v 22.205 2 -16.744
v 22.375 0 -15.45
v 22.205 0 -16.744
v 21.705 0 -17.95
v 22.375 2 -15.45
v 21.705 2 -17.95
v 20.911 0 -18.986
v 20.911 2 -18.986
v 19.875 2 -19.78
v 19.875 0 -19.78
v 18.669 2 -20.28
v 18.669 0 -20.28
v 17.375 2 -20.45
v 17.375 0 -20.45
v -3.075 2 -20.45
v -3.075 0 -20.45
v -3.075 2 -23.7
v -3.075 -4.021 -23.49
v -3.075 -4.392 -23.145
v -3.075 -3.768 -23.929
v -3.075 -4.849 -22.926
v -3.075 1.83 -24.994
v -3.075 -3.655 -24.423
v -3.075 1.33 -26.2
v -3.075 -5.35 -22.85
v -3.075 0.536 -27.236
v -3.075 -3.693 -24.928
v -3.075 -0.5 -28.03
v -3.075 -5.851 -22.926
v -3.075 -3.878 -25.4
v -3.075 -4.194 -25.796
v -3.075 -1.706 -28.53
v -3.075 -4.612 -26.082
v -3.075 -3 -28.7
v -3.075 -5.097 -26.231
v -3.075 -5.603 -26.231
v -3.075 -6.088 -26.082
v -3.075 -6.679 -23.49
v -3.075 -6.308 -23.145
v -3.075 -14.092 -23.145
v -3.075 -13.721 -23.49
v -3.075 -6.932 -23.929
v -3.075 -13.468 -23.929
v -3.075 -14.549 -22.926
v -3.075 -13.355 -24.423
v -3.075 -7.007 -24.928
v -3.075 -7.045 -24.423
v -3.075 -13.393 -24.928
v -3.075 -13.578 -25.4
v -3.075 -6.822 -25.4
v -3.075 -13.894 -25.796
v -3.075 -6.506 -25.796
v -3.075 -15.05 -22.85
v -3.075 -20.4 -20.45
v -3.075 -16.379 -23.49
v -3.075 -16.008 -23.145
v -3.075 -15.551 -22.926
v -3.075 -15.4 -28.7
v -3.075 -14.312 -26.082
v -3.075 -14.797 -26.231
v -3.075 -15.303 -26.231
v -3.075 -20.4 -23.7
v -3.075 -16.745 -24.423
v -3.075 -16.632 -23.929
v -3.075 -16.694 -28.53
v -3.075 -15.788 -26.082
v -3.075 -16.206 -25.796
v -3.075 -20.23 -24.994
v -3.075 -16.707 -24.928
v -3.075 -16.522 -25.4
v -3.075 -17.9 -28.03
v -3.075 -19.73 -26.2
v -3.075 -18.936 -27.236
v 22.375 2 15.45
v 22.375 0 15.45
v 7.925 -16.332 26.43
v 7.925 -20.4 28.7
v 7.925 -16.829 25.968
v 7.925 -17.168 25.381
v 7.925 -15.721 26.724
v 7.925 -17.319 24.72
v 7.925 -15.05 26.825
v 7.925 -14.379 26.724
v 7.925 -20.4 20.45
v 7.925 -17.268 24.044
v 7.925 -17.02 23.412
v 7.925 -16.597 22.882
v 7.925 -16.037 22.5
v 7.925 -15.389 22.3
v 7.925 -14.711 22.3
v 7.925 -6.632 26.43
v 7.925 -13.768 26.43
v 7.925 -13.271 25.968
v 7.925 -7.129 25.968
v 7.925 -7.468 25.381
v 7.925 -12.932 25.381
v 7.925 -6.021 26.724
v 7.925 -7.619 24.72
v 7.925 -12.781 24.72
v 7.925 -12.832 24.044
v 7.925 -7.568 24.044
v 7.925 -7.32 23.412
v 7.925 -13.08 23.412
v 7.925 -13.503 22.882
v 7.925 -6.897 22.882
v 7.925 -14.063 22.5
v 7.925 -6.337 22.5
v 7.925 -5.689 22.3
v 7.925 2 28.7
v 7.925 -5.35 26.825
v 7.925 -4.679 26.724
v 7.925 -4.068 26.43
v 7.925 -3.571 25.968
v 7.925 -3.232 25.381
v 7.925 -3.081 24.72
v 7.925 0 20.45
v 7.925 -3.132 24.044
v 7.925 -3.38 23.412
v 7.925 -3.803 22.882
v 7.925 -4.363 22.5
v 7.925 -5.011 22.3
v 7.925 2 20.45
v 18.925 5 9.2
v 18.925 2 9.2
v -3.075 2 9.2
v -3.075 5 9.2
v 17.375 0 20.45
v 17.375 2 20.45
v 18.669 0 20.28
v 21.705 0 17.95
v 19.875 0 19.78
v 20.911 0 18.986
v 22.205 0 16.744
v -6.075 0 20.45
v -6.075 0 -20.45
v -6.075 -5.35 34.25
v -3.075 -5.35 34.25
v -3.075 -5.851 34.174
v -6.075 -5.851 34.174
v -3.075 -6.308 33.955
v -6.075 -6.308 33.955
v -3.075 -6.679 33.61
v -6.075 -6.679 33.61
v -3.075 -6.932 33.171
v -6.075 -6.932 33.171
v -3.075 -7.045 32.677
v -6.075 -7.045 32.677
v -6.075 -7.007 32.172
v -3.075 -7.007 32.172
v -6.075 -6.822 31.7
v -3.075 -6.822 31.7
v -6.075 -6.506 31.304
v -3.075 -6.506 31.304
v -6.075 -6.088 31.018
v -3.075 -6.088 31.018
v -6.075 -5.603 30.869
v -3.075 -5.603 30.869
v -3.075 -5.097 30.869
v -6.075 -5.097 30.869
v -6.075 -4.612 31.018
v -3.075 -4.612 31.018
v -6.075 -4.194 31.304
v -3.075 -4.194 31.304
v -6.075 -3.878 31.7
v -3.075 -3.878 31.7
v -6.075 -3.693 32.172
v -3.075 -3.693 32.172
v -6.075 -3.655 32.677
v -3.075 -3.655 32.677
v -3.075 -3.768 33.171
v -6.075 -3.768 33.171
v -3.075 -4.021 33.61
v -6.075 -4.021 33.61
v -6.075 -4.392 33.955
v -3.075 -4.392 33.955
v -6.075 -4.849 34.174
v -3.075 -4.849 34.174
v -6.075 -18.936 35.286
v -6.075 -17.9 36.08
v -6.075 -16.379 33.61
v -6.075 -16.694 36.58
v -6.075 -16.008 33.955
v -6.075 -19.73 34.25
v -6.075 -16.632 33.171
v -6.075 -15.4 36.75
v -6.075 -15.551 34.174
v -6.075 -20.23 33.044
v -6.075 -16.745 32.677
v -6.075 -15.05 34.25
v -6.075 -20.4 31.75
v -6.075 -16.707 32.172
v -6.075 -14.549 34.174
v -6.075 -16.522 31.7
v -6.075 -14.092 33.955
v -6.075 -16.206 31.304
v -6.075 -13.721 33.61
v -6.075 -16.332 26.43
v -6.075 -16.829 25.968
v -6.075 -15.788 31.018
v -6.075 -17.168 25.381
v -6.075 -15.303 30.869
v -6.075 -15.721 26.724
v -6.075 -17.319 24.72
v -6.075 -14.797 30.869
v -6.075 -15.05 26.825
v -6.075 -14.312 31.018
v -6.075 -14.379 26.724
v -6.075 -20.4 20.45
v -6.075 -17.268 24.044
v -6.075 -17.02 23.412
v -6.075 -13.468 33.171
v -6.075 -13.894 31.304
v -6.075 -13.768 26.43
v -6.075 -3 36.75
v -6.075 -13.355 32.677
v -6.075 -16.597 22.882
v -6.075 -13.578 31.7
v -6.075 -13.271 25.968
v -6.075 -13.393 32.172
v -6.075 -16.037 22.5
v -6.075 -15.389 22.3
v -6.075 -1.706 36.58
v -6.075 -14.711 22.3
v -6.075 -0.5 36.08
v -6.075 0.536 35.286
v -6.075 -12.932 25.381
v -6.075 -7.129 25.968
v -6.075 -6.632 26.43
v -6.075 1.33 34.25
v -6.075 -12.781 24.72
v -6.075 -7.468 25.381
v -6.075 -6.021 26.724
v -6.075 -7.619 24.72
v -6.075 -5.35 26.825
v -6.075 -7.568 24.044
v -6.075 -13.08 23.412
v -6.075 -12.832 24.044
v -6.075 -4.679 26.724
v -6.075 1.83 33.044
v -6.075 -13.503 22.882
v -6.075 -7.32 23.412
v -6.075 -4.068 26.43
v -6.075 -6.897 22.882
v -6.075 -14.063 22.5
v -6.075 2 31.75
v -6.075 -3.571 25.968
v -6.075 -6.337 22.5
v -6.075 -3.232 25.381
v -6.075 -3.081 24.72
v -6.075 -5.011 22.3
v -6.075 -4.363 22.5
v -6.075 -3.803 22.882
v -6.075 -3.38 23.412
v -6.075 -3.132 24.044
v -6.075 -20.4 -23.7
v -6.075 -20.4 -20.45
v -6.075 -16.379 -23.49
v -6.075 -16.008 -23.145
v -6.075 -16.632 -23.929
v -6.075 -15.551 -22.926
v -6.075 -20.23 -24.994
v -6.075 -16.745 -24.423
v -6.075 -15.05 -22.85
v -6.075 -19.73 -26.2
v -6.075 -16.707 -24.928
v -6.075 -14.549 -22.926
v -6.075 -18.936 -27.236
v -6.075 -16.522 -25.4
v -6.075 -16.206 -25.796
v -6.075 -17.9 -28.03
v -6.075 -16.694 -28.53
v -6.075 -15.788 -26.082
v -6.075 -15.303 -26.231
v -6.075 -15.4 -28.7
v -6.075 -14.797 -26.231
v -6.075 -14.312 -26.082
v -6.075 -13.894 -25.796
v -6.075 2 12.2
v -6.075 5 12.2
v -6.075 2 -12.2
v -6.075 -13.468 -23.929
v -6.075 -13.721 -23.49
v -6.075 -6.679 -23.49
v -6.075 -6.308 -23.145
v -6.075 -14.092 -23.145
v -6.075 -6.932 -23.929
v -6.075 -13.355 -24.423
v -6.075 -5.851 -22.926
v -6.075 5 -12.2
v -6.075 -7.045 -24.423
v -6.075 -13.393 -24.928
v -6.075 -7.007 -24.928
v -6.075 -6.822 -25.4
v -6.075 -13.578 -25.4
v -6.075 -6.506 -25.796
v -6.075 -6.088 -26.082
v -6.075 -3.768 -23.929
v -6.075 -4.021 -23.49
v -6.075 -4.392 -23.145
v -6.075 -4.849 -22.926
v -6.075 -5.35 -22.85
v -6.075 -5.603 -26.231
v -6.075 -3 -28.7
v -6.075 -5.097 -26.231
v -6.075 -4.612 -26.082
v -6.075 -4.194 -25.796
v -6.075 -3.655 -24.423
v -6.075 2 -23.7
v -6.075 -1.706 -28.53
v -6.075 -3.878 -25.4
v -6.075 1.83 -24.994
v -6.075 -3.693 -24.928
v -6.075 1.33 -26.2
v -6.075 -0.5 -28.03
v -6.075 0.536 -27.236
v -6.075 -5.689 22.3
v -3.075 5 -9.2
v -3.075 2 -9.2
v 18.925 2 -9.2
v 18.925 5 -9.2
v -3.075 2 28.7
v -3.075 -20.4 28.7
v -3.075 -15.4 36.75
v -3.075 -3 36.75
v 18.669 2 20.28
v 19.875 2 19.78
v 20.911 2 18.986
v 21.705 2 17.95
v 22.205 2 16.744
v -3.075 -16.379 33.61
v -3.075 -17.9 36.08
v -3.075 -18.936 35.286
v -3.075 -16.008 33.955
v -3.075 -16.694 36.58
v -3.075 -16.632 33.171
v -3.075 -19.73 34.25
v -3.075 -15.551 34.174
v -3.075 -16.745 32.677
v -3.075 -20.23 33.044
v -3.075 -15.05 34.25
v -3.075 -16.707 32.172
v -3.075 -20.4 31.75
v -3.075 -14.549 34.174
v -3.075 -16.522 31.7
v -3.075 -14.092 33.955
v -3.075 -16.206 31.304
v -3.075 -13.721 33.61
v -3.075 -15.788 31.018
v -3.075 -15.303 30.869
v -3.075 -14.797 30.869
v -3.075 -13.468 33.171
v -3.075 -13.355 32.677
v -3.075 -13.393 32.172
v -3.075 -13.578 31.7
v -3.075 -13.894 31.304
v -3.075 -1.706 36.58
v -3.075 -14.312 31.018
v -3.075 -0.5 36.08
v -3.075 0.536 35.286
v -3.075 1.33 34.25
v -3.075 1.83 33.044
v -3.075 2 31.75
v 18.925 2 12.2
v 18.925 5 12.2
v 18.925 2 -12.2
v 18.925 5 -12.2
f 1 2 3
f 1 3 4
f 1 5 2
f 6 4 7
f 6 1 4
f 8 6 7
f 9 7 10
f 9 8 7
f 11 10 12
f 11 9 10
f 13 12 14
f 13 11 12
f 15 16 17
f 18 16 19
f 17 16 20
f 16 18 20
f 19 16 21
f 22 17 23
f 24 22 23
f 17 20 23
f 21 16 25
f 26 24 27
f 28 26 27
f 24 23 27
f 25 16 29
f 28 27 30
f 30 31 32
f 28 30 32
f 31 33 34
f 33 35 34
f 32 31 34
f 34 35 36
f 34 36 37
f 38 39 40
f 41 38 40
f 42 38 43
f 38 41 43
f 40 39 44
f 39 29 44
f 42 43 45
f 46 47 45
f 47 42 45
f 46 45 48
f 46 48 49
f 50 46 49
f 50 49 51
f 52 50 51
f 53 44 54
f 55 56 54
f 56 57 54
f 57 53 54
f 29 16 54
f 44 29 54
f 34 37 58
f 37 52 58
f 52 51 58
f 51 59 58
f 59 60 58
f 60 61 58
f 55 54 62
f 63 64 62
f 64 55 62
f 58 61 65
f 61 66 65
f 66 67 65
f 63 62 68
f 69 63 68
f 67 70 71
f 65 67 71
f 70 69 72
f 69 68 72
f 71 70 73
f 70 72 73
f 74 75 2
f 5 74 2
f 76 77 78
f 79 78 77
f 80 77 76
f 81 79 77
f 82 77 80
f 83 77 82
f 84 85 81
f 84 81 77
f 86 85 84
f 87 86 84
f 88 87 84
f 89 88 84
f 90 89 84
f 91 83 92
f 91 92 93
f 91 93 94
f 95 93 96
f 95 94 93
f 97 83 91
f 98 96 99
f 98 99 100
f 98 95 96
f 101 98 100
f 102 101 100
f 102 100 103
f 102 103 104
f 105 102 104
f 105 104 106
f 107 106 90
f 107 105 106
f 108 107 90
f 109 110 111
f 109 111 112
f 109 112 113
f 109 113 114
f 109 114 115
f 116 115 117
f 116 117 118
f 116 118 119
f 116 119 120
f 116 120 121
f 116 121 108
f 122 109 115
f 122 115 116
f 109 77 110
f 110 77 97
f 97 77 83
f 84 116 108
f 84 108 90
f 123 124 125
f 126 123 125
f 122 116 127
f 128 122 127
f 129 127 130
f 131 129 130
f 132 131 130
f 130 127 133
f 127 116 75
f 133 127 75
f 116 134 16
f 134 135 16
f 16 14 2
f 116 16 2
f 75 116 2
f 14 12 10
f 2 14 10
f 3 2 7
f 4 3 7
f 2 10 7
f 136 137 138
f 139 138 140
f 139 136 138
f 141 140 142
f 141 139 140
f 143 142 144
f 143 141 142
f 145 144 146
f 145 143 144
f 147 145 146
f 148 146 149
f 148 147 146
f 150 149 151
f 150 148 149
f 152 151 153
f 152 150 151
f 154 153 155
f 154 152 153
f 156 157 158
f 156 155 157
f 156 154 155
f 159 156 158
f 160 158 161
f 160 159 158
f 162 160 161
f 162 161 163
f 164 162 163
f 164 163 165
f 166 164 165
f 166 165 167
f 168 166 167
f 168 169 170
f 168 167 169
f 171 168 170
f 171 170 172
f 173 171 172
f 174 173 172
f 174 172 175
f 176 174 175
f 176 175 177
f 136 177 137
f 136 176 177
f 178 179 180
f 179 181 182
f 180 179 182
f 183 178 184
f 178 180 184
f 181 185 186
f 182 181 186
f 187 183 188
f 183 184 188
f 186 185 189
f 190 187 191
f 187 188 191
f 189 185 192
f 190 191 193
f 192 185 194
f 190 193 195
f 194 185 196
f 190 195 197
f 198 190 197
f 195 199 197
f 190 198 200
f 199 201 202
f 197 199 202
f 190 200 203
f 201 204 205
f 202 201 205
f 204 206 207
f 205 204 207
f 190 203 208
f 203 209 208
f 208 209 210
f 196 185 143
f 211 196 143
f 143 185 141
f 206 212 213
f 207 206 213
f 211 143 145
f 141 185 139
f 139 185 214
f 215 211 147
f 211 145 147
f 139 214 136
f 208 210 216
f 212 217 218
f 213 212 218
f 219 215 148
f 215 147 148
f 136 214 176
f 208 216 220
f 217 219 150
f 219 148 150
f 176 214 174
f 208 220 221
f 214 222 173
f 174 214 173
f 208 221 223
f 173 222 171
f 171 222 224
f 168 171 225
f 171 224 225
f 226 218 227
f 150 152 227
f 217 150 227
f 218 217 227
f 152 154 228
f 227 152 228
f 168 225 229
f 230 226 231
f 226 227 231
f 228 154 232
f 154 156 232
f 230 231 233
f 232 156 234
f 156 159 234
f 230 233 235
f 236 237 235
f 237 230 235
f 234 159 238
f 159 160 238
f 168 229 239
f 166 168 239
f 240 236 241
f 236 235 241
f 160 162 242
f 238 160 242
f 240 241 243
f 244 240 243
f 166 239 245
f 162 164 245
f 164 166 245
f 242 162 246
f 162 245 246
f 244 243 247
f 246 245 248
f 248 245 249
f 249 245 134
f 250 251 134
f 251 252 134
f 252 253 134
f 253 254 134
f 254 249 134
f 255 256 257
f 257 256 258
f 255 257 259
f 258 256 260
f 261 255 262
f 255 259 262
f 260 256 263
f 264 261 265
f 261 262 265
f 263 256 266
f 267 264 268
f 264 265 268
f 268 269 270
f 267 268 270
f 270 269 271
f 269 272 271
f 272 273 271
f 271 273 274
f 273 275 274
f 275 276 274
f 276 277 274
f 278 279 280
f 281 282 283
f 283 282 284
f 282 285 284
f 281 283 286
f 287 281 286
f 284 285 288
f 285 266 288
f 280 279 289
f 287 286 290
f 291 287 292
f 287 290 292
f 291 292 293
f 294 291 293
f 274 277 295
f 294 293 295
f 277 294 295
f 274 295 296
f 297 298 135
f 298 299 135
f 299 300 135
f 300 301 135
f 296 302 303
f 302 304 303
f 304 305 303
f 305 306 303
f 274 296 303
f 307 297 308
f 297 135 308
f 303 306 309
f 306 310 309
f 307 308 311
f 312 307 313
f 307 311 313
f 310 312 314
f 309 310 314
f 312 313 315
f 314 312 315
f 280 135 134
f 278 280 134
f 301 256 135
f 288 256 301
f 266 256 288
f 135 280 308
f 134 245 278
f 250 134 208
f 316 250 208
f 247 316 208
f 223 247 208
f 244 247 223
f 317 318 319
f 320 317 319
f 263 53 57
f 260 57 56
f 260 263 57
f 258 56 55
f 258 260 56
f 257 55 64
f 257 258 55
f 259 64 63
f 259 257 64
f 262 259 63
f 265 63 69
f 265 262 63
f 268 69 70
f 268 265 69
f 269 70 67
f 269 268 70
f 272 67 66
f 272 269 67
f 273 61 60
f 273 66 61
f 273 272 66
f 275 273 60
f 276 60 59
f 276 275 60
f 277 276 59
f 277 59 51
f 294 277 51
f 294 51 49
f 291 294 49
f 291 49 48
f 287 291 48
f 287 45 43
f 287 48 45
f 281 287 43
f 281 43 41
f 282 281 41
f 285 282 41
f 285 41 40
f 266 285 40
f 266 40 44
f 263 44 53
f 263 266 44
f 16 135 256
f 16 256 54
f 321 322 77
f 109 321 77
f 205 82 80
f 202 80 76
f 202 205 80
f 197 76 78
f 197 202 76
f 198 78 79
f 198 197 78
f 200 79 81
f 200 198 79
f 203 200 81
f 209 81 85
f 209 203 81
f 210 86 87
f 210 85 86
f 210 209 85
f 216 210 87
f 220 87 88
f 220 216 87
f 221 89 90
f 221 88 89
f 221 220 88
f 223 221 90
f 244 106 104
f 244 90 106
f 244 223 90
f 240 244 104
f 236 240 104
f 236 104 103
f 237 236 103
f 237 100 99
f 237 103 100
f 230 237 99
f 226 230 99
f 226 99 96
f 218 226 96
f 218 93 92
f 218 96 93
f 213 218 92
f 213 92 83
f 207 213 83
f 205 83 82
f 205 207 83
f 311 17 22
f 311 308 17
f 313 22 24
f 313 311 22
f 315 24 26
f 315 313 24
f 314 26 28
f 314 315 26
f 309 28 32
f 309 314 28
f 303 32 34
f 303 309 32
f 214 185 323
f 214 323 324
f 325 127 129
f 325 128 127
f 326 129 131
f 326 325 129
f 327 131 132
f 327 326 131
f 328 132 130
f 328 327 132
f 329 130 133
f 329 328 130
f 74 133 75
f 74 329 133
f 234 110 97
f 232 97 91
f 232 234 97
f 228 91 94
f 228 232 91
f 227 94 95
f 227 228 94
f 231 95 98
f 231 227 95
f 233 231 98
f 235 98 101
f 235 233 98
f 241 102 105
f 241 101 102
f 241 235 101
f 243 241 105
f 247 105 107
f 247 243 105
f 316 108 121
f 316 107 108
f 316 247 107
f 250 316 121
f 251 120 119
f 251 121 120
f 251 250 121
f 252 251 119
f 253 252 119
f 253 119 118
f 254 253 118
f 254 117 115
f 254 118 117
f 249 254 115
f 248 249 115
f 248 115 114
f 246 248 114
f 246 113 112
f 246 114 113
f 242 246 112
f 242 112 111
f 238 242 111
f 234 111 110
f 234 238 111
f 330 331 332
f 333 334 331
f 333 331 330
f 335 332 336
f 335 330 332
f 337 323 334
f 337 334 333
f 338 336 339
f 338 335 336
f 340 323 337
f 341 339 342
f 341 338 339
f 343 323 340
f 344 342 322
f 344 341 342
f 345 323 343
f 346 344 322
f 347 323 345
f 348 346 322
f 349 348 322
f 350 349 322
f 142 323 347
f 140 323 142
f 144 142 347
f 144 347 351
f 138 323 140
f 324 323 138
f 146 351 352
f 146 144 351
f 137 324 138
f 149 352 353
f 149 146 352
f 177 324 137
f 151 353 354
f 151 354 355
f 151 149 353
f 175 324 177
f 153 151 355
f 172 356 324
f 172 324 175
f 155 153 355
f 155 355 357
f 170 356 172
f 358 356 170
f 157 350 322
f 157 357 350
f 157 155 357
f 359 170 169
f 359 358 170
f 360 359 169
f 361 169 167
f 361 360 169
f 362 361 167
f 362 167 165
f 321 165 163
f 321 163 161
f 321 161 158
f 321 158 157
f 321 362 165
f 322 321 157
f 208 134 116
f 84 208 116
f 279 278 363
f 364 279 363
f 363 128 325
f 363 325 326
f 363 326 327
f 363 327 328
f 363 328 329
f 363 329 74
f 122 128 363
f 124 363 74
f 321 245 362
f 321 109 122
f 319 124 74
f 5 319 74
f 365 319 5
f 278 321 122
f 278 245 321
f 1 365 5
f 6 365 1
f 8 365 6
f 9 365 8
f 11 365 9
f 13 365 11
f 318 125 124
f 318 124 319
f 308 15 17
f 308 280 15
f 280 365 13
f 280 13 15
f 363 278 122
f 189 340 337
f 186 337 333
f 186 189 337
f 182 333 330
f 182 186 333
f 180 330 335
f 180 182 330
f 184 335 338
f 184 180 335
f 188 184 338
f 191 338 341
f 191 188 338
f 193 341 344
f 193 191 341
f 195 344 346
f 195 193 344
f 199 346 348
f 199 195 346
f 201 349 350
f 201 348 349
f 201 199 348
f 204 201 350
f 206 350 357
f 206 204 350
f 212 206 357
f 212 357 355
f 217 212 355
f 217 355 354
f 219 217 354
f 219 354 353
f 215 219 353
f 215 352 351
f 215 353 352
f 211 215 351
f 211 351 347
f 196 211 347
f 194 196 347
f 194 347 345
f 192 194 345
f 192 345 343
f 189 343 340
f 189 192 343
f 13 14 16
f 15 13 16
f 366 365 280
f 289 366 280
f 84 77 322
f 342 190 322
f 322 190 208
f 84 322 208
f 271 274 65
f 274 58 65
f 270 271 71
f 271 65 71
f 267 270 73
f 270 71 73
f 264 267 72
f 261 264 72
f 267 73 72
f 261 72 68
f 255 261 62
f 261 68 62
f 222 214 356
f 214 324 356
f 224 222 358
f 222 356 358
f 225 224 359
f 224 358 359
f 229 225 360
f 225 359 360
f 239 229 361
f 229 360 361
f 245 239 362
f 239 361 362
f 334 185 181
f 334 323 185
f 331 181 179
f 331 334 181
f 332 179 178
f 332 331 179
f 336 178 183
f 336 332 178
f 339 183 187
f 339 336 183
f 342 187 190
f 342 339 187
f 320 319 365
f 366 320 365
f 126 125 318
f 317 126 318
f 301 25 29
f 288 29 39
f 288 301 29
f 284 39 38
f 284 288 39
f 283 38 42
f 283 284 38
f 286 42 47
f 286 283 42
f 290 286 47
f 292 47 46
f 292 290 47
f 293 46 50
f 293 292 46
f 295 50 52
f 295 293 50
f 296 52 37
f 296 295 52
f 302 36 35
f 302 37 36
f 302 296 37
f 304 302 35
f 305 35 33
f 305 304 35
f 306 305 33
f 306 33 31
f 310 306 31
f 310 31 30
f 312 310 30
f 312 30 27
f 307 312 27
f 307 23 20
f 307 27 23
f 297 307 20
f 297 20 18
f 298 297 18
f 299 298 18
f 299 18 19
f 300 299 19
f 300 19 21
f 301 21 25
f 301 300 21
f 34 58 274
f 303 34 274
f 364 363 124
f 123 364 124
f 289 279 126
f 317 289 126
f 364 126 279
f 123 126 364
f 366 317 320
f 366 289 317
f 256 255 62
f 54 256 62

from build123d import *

# Parameters (mm, degrees)
BOSS_EXTRUDE1_DEPTH = 2
SKETCH1_3_W         = 14
SKETCH1_3_H         = 8.25
SKETCH1_3_W_2       = 3
BOSS_EXTRUDE2_DEPTH = 20.4
BOSS_EXTRUDE4_START = -6.075
SKETCH5_W           = 8.05
SKETCH5_H           = 22.4
BOSS_EXTRUDE4_DEPTH = 3
CUT_EXTRUDE1_START  = -6.075
SKETCH2_R           = 1.7
SKETCH2_R_2         = 2.275
CUT_EXTRUDE1_DEPTH  = 54.691836571
FILLET1_R           = 5
SKETCH6_W           = 3
SKETCH6_H           = 18.4
BOSS_EXTRUDE5_DEPTH = 5


with BuildPart() as part:
    # Sketch1 → Boss-Extrude1 (new body)
    with BuildSketch(Plane(origin=(0, 0, 0), x_dir=(1, 0, 0), z_dir=(0, 1, 0))):
        Polygon((22.375, -20.45), (22.375, 20.45), (-3.075, 20.45), (-3.075, 28.7), (-6.075, 28.7), (-6.075, -28.7), (7.925, -28.7), (7.925, -20.45), align=None)
    extrude(amount=BOSS_EXTRUDE1_DEPTH)

    # Sketch1<3> → Boss-Extrude2 (add)
    with BuildSketch(Plane(origin=(0, 0, 0), x_dir=(1, 0, 0), z_dir=(0, 1, 0))):
        with Locations((0.925, -24.575)):
            Rectangle(SKETCH1_3_W, SKETCH1_3_H)
        with Locations((-4.575, 24.575)):
            Rectangle(SKETCH1_3_W_2, SKETCH1_3_H)
    extrude(amount=-BOSS_EXTRUDE2_DEPTH)

    # Sketch5 → Boss-Extrude4 (add)
    with BuildSketch(Plane(origin=(0, 0, 0), x_dir=(0, 0, -1), z_dir=(1, 0, 0)).offset(BOSS_EXTRUDE4_START)):
        with Locations((-32.725, -9.2)):
            Rectangle(SKETCH5_W, SKETCH5_H)
    extrude(amount=BOSS_EXTRUDE4_DEPTH)

    # Sketch2 → Cut-Extrude1 (cut, through all)
    with BuildSketch(Plane(origin=(0, 0, 0), x_dir=(0, 0, -1), z_dir=(1, 0, 0)).offset(CUT_EXTRUDE1_START)):
        with Locations(Location((24.55, -15.05, 0), (0, 0, 180))):
            Circle(SKETCH2_R)
        with Locations(Location((-24.55, -15.05, 0), (0, 0, 180))):
            Circle(SKETCH2_R_2)
        with Locations(Location((-24.55, -5.35, 0), (0, 0, 180))):
            Circle(SKETCH2_R_2)
        with Locations(Location((24.55, -5.35, 0), (0, 0, 180))):
            Circle(SKETCH2_R)
        with Locations(Location((-32.55, -5.35, 0), (0, 0, 180))):
            Circle(SKETCH2_R)
        with Locations(Location((-32.55, -15.05, 0), (0, 0, 180))):
            Circle(SKETCH2_R)
    extrude(amount=CUT_EXTRUDE1_DEPTH, mode=Mode.SUBTRACT)

    # Fillet1
    fillet1_edges = [part.edges().sort_by_distance(p)[0] for p in [
        (22.375, 1, -20.45),
        (22.375, 1, 20.45),
        (-4.575, -20.4, -28.7),
        (-4.575, 2, -28.7),
        (-4.575, 2, 36.75),
        (-4.575, -20.4, 36.75),
    ]]
    fillet(fillet1_edges, radius=FILLET1_R)

    # Sketch6 → Boss-Extrude5 (add)
    with BuildSketch(Plane(origin=(0, 0, 0), x_dir=(1, 0, 0), z_dir=(0, 1, 0))):
        Polygon((-6.075, 12.2), (-6.075, 9.2), (-3.075, 9.2), (18.925, 9.2), (18.925, 12.2), align=None)
        with Locations((-4.575, 0)):
            Rectangle(SKETCH6_W, SKETCH6_H)
        Polygon((-3.075, -9.2), (-6.075, -9.2), (-6.075, -12.2), (18.925, -12.2), (18.925, -9.2), align=None)
    extrude(amount=BOSS_EXTRUDE5_DEPTH)


solid = part.part
